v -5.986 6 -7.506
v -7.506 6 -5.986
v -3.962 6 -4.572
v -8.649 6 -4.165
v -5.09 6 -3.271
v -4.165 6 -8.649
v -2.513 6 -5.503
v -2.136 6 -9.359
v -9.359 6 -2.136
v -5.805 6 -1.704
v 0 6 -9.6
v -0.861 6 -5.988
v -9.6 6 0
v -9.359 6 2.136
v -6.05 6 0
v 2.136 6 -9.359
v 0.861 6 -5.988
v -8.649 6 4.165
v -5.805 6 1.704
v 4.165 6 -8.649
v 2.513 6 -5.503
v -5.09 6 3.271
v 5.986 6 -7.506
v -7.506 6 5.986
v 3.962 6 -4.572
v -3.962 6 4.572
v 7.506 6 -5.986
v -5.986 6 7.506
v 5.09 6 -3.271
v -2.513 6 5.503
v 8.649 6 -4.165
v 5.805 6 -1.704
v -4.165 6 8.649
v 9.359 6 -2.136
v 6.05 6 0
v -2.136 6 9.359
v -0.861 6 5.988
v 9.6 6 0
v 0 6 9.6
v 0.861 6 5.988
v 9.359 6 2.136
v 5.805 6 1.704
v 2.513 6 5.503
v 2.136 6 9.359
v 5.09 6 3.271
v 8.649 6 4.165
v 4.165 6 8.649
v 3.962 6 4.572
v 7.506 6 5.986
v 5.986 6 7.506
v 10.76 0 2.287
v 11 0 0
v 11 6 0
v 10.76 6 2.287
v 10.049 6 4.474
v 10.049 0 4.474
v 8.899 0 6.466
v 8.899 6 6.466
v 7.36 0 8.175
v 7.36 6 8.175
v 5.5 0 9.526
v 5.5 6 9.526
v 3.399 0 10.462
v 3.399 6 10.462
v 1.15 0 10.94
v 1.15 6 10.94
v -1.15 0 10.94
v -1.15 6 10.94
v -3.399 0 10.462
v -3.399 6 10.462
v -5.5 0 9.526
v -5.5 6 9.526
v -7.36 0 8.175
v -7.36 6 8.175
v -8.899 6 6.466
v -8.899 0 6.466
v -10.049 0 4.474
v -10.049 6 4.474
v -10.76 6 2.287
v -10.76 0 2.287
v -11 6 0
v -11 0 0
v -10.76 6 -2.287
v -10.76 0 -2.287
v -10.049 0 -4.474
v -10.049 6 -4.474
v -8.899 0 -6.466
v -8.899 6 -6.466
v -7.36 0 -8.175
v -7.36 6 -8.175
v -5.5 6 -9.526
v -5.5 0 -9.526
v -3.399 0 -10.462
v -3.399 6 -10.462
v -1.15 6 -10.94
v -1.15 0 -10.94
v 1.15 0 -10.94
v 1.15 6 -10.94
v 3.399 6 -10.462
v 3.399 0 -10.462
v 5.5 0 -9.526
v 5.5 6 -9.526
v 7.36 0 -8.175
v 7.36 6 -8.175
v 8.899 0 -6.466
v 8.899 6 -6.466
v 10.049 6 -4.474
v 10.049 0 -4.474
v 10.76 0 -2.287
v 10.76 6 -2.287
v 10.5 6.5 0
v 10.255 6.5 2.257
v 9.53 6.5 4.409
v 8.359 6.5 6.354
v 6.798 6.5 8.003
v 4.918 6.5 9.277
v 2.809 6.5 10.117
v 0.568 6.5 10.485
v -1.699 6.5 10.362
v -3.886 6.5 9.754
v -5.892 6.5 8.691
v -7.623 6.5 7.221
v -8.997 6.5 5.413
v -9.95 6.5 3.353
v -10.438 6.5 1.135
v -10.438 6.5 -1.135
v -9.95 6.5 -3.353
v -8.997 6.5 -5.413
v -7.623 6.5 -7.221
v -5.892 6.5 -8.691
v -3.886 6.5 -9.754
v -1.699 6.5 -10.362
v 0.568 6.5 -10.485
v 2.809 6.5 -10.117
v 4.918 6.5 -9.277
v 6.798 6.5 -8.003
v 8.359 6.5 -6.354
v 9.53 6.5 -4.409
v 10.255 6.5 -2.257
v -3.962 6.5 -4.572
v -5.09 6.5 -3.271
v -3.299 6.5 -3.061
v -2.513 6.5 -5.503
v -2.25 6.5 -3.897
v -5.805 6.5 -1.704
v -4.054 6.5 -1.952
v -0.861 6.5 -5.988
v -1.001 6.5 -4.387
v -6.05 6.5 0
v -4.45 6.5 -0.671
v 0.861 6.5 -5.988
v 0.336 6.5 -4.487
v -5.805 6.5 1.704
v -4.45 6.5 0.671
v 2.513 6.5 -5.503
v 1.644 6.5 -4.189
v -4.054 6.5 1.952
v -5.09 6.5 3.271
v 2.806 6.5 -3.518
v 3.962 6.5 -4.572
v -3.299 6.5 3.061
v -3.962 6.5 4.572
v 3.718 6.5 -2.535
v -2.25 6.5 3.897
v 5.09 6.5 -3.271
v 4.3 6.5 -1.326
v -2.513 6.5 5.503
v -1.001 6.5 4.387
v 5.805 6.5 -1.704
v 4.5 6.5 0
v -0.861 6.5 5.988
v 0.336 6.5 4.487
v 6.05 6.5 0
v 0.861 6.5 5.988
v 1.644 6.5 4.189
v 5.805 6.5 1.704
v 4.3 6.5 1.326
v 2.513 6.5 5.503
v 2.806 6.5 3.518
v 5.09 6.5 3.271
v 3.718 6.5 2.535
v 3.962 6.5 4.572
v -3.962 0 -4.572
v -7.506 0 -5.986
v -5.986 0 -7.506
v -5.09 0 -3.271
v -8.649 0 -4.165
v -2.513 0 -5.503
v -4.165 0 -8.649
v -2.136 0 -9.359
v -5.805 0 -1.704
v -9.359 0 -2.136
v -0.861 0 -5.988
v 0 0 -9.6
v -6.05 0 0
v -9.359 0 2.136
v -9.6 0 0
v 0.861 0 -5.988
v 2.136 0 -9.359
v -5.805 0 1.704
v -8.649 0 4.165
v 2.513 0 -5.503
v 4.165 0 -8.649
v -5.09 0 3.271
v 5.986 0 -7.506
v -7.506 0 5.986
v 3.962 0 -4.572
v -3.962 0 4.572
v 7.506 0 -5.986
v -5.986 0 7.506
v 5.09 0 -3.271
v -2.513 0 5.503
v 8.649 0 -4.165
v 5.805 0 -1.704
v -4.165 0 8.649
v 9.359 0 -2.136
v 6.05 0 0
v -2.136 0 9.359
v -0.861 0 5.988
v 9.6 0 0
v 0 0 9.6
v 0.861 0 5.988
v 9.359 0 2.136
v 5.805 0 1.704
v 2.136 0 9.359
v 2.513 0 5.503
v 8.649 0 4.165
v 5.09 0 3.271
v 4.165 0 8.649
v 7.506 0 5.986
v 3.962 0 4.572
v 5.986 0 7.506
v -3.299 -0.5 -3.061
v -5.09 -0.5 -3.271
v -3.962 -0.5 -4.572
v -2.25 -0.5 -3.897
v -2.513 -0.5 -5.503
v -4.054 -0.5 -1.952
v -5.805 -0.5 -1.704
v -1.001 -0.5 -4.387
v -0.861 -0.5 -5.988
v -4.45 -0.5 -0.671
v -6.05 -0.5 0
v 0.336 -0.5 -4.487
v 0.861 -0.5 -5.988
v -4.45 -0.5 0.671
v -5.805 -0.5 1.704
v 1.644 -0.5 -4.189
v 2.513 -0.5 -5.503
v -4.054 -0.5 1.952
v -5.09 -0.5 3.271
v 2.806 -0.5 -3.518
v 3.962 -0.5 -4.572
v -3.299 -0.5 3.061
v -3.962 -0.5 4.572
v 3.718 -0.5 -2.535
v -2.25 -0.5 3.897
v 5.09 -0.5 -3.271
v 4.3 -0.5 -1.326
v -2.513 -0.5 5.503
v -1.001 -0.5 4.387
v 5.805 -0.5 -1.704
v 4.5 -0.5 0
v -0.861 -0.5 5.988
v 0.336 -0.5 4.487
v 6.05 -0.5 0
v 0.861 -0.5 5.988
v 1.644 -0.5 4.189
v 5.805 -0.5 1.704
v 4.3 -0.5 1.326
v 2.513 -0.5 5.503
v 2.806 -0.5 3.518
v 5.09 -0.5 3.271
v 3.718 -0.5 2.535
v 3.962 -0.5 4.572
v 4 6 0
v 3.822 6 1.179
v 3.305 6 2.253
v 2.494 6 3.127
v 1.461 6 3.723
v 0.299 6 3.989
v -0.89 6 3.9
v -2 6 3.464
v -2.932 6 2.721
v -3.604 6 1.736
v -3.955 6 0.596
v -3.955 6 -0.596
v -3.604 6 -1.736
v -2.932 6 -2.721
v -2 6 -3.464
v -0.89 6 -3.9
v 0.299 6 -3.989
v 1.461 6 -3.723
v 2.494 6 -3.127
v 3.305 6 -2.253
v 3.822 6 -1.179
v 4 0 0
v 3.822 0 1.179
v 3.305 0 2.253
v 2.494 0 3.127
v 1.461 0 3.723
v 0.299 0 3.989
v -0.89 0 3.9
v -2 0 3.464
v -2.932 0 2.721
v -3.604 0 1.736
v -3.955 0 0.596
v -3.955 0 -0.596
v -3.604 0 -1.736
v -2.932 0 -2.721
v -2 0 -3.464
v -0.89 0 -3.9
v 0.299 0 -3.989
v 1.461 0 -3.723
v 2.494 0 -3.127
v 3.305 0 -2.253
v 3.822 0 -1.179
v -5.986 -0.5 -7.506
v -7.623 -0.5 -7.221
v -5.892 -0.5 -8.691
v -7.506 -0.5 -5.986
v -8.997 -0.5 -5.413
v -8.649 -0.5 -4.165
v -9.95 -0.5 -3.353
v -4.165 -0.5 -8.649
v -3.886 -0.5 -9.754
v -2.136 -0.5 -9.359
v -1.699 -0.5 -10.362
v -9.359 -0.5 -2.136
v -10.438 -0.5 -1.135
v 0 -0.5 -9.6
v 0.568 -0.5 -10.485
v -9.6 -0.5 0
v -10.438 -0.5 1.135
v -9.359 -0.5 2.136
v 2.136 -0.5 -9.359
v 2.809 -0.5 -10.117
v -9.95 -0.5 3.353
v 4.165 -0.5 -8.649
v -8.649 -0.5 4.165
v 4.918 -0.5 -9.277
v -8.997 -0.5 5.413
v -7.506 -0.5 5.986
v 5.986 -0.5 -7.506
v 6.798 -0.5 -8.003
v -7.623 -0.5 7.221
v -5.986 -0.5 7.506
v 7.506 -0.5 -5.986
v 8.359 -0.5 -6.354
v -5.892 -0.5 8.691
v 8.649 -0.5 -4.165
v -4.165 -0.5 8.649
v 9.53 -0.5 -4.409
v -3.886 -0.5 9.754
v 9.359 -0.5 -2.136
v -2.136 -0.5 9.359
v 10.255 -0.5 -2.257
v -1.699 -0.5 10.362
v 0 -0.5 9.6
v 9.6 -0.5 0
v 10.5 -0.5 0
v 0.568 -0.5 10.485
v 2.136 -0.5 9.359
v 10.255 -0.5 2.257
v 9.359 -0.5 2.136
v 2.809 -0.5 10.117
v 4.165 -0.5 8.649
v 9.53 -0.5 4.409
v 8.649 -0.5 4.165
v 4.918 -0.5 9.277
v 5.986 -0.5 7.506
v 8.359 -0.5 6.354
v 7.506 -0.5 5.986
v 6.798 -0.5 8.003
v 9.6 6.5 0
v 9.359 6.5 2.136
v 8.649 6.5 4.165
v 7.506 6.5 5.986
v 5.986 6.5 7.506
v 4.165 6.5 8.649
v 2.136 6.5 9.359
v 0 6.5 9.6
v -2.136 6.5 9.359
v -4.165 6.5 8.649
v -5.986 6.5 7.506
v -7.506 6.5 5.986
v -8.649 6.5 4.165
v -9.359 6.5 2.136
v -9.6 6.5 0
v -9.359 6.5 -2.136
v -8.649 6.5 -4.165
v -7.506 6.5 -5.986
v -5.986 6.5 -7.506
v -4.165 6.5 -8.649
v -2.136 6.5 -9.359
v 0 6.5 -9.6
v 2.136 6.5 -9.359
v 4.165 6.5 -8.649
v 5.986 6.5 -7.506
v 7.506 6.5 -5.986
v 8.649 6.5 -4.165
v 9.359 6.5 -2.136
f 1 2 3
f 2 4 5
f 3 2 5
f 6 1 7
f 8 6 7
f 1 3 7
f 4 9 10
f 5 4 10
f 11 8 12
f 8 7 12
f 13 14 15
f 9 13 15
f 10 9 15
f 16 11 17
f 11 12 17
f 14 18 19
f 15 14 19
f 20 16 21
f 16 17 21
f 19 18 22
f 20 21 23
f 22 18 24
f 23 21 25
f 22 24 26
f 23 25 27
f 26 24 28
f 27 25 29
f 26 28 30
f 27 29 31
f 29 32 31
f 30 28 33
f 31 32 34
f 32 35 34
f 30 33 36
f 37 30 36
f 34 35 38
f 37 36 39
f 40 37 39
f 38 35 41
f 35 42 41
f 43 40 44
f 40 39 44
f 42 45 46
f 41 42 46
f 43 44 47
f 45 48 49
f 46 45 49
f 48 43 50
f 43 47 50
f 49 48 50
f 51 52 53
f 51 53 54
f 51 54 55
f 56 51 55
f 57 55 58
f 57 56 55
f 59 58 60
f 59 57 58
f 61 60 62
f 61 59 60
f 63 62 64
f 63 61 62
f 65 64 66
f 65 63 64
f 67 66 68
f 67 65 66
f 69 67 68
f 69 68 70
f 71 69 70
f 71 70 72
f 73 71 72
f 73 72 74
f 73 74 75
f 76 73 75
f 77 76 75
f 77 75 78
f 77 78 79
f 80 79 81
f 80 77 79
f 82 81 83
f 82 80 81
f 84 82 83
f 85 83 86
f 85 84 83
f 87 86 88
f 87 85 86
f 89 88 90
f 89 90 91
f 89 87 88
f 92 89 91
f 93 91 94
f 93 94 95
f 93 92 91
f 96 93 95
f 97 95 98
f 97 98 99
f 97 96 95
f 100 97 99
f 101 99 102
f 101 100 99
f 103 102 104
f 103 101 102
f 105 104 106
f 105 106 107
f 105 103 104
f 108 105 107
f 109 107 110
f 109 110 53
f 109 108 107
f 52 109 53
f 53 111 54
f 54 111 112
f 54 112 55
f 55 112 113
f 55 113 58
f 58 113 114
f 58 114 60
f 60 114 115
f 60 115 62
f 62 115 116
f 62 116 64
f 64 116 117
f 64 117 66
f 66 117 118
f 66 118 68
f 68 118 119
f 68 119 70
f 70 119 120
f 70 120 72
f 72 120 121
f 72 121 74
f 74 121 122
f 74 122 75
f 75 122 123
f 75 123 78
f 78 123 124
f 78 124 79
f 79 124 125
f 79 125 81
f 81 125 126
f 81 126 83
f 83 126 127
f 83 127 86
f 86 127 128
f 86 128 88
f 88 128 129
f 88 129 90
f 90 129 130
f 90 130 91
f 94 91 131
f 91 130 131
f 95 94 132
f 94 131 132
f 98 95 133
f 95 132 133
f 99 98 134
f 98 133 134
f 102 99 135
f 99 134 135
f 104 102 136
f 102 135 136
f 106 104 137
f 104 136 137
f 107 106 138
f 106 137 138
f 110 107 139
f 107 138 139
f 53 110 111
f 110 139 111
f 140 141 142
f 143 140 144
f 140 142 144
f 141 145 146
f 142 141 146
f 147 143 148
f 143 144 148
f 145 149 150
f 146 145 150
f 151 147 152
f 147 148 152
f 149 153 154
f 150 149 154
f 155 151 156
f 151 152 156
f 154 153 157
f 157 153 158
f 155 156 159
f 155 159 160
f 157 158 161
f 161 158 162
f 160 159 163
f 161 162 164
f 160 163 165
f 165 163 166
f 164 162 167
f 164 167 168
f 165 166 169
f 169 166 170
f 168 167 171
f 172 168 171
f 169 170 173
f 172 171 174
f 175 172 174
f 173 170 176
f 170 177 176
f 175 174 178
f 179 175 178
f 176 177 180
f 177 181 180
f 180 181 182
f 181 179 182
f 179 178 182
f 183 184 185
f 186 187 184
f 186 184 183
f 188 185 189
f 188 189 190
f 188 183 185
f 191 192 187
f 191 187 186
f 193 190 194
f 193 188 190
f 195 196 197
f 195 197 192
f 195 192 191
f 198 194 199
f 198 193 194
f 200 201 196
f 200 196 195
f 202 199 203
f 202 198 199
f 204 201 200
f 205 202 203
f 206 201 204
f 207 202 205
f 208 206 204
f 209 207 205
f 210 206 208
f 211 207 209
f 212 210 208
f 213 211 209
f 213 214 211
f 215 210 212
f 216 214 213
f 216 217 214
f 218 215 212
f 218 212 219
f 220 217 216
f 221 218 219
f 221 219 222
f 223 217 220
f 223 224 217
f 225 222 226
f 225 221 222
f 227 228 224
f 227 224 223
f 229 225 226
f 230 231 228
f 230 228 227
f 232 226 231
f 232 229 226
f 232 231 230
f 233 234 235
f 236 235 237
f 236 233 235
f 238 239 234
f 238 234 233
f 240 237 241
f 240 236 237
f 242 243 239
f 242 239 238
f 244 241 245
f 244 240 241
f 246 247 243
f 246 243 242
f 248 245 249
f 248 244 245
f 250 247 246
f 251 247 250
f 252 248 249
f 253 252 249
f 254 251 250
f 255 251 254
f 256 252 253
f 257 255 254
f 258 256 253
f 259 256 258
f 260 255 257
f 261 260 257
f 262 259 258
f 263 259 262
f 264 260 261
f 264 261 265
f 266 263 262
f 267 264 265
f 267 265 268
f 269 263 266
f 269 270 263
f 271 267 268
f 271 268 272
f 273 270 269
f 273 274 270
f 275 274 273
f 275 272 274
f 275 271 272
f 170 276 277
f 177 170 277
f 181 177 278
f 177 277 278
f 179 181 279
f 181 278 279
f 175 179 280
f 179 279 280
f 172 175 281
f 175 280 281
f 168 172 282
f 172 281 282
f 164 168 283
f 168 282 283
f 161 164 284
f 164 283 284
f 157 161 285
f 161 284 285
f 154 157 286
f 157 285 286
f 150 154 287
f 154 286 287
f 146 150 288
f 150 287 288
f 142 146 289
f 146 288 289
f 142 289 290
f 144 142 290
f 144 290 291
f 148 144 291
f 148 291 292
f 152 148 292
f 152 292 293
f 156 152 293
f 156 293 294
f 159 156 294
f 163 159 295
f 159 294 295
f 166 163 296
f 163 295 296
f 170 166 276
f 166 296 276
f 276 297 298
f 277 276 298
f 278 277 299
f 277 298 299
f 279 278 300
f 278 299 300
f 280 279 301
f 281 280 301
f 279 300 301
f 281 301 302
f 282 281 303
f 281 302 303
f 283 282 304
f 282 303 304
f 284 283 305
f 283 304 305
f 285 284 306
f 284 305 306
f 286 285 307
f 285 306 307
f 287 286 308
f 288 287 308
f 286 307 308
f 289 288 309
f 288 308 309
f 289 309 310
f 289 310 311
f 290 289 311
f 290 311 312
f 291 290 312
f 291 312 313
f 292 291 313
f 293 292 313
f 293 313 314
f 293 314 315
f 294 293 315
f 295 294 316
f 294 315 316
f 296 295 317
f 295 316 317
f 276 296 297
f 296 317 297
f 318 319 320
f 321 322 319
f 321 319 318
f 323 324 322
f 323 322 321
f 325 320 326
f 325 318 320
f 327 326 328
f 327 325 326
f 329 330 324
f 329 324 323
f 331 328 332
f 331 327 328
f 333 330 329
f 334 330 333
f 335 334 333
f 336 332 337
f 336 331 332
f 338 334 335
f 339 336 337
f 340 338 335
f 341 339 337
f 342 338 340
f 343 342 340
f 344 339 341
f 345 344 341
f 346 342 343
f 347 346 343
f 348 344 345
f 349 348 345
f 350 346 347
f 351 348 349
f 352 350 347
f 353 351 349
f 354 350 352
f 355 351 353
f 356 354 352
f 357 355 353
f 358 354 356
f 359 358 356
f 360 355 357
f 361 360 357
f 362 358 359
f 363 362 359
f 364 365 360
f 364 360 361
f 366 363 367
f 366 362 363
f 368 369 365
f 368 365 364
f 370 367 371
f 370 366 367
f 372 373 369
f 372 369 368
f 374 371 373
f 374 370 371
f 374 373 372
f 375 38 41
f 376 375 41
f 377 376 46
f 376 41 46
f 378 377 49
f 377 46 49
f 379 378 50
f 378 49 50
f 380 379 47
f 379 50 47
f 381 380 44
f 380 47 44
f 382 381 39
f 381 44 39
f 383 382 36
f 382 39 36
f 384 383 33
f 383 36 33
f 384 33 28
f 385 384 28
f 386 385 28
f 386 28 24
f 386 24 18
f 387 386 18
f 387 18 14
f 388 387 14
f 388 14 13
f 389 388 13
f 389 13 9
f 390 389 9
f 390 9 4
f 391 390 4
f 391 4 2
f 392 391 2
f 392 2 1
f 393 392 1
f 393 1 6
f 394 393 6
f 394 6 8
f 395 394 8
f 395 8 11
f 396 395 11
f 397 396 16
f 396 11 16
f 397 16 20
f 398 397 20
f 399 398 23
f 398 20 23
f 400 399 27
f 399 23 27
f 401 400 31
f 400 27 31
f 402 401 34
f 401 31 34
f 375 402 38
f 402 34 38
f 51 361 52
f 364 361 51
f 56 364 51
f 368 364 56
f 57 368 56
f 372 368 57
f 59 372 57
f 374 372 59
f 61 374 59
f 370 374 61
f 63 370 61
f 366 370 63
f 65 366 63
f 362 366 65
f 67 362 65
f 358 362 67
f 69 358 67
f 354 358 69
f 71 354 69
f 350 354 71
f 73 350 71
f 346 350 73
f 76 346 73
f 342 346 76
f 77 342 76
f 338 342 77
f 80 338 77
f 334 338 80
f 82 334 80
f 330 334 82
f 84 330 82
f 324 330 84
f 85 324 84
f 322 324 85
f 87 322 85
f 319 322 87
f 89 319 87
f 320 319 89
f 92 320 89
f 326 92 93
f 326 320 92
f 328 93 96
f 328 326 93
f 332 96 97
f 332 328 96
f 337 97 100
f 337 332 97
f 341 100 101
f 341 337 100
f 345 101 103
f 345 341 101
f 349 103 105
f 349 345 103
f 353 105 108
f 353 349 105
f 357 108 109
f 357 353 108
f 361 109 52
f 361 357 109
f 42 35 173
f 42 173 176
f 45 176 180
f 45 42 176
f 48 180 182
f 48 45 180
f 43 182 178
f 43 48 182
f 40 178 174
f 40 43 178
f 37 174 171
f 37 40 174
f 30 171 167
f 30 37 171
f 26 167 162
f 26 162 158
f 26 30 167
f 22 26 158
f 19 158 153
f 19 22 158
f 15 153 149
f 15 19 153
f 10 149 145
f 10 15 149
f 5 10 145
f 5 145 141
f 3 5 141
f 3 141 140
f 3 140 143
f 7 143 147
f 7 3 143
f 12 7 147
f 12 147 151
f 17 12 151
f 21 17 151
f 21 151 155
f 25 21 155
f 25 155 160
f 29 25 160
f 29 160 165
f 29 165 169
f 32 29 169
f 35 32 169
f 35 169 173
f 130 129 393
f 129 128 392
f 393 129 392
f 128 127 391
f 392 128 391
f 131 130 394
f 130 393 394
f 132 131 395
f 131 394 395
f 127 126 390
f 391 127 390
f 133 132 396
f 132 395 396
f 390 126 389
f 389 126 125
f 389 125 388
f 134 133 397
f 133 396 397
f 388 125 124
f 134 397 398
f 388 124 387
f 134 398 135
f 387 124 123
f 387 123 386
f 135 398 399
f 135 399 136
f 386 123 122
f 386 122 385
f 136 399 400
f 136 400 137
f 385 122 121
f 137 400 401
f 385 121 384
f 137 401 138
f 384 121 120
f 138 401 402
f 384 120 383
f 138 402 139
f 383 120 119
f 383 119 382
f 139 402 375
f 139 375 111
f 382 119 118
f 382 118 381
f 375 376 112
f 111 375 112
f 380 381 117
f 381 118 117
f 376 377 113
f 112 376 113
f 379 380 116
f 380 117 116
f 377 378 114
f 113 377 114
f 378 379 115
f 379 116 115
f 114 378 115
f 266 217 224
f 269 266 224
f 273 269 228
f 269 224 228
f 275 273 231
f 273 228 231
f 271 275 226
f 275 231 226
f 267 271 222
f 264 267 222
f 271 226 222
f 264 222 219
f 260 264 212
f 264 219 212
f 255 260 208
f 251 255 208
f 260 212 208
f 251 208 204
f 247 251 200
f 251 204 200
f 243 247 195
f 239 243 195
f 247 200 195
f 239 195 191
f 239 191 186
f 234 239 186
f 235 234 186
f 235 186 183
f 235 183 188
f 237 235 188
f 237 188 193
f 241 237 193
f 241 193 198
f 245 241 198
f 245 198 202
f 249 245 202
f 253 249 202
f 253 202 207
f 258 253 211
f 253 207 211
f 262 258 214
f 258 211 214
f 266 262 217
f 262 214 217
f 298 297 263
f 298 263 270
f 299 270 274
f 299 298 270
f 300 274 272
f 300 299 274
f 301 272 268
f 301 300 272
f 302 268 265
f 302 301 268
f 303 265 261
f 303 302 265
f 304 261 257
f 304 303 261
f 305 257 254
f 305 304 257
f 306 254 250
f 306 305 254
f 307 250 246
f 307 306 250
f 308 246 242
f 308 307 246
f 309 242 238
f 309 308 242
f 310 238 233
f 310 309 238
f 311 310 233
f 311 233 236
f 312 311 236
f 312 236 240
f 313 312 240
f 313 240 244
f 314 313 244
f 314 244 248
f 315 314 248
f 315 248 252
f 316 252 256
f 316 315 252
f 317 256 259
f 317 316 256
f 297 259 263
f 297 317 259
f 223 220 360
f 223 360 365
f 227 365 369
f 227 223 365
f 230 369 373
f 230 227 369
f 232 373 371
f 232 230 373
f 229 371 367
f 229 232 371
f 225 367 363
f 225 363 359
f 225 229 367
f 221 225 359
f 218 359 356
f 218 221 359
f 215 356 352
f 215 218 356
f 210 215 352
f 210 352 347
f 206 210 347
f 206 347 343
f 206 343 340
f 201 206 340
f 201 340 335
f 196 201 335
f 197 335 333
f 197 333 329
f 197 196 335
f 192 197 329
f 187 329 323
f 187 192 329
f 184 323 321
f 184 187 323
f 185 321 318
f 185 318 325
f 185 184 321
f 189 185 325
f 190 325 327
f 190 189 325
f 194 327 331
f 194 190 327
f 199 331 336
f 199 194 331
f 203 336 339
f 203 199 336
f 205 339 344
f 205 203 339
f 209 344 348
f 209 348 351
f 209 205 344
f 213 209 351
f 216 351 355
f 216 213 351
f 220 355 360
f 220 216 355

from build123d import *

# Parameters (mm, degrees)
F0_R          = 11
F0_R_2        = 4
F1_DEPTH      = 6
F2_R          = 11
F2_R_2        = 9.6
F2_R_3        = 6.05
F2_R_4        = 4
F3_DEPTH      = 0.5
F3_DEPTH_BACK = 6.5
F4_SIZE       = 0.49999


# Not quite as in the source:
# - a fillet or chamfer is up to 0.001 mm smaller than in the source, because OpenCascade refuses the exact size


with BuildPart() as f1:
    # F0 (on Front) → F1 (new body)
    with BuildSketch(Plane.XZ):
        Circle(F0_R)
        Circle(F0_R_2, mode=Mode.SUBTRACT)
    extrude(amount=-F1_DEPTH)

    # F2 (on face) → F3 (join, two sides)
    with BuildSketch(Plane.XZ) as f3_sk:
        Circle(F2_R)
        Circle(F2_R_2, mode=Mode.SUBTRACT)
        Circle(F2_R_3)
        Circle(F2_R_4, mode=Mode.SUBTRACT)
    extrude(amount=F3_DEPTH)
    extrude(f3_sk.sketch, amount=-F3_DEPTH_BACK)

    # F4 (size 0.5 in the source; OpenCascade refuses exactly that, so slightly less here)
    f4_edges = [f1.edges().sort_by_distance(p)[0] for p in [
        (-11, -0.5, 0),
        (-4, -0.5, 0),
        (-11, 6.5, 0),
        (-4, 6.5, 0),
    ]]
    chamfer(f4_edges, length=F4_SIZE)


solid = f1.part
